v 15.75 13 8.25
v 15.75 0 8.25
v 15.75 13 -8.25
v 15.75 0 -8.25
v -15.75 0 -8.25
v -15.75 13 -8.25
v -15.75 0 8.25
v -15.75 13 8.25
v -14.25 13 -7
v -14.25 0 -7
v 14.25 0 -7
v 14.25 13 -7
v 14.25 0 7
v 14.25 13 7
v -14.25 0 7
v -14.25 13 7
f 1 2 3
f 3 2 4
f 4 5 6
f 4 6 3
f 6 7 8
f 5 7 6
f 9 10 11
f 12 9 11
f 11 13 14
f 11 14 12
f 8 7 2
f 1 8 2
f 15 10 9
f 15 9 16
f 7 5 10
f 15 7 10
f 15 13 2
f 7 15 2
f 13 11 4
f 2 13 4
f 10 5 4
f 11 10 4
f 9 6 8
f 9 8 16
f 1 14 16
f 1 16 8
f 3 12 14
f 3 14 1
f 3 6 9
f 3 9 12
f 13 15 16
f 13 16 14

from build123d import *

# Parameters (mm, degrees)
SKETCH1_W           = 31.5
SKETCH1_H           = 16.5
BOSS_EXTRUDE1_DEPTH = 13
SKETCH2_W           = 21.5
SKETCH2_H           = 2
CUT_EXTRUDE1_DEPTH  = 14


with BuildPart() as part:
    # Sketch1 → Boss-Extrude1 (new body)
    with BuildSketch(Plane(origin=(0, 0, 0), x_dir=(1, 0, 0), z_dir=(0, 1, 0))):
        Rectangle(SKETCH1_W, SKETCH1_H)
        Polygon((10.75, 5), (-10.75, 5), (-10.75, 7), (-14.25, 7), (-14.25, -7), (-10.75, -7), (-10.75, -5), (10.75, -5), (10.75, -7), (14.25, -7), (14.25, 7), (10.75, 7), align=None, mode=Mode.SUBTRACT)
    extrude(amount=BOSS_EXTRUDE1_DEPTH)

    # Sketch2 → Cut-Extrude1 (cut, through all)
    with BuildSketch(Plane.XZ):
        with Locations((0, 6)):
            Rectangle(SKETCH2_W, SKETCH2_H)
        with Locations((0, -6)):
            Rectangle(SKETCH2_W, SKETCH2_H)
    extrude(amount=-CUT_EXTRUDE1_DEPTH, mode=Mode.SUBTRACT)


solid = part.part
